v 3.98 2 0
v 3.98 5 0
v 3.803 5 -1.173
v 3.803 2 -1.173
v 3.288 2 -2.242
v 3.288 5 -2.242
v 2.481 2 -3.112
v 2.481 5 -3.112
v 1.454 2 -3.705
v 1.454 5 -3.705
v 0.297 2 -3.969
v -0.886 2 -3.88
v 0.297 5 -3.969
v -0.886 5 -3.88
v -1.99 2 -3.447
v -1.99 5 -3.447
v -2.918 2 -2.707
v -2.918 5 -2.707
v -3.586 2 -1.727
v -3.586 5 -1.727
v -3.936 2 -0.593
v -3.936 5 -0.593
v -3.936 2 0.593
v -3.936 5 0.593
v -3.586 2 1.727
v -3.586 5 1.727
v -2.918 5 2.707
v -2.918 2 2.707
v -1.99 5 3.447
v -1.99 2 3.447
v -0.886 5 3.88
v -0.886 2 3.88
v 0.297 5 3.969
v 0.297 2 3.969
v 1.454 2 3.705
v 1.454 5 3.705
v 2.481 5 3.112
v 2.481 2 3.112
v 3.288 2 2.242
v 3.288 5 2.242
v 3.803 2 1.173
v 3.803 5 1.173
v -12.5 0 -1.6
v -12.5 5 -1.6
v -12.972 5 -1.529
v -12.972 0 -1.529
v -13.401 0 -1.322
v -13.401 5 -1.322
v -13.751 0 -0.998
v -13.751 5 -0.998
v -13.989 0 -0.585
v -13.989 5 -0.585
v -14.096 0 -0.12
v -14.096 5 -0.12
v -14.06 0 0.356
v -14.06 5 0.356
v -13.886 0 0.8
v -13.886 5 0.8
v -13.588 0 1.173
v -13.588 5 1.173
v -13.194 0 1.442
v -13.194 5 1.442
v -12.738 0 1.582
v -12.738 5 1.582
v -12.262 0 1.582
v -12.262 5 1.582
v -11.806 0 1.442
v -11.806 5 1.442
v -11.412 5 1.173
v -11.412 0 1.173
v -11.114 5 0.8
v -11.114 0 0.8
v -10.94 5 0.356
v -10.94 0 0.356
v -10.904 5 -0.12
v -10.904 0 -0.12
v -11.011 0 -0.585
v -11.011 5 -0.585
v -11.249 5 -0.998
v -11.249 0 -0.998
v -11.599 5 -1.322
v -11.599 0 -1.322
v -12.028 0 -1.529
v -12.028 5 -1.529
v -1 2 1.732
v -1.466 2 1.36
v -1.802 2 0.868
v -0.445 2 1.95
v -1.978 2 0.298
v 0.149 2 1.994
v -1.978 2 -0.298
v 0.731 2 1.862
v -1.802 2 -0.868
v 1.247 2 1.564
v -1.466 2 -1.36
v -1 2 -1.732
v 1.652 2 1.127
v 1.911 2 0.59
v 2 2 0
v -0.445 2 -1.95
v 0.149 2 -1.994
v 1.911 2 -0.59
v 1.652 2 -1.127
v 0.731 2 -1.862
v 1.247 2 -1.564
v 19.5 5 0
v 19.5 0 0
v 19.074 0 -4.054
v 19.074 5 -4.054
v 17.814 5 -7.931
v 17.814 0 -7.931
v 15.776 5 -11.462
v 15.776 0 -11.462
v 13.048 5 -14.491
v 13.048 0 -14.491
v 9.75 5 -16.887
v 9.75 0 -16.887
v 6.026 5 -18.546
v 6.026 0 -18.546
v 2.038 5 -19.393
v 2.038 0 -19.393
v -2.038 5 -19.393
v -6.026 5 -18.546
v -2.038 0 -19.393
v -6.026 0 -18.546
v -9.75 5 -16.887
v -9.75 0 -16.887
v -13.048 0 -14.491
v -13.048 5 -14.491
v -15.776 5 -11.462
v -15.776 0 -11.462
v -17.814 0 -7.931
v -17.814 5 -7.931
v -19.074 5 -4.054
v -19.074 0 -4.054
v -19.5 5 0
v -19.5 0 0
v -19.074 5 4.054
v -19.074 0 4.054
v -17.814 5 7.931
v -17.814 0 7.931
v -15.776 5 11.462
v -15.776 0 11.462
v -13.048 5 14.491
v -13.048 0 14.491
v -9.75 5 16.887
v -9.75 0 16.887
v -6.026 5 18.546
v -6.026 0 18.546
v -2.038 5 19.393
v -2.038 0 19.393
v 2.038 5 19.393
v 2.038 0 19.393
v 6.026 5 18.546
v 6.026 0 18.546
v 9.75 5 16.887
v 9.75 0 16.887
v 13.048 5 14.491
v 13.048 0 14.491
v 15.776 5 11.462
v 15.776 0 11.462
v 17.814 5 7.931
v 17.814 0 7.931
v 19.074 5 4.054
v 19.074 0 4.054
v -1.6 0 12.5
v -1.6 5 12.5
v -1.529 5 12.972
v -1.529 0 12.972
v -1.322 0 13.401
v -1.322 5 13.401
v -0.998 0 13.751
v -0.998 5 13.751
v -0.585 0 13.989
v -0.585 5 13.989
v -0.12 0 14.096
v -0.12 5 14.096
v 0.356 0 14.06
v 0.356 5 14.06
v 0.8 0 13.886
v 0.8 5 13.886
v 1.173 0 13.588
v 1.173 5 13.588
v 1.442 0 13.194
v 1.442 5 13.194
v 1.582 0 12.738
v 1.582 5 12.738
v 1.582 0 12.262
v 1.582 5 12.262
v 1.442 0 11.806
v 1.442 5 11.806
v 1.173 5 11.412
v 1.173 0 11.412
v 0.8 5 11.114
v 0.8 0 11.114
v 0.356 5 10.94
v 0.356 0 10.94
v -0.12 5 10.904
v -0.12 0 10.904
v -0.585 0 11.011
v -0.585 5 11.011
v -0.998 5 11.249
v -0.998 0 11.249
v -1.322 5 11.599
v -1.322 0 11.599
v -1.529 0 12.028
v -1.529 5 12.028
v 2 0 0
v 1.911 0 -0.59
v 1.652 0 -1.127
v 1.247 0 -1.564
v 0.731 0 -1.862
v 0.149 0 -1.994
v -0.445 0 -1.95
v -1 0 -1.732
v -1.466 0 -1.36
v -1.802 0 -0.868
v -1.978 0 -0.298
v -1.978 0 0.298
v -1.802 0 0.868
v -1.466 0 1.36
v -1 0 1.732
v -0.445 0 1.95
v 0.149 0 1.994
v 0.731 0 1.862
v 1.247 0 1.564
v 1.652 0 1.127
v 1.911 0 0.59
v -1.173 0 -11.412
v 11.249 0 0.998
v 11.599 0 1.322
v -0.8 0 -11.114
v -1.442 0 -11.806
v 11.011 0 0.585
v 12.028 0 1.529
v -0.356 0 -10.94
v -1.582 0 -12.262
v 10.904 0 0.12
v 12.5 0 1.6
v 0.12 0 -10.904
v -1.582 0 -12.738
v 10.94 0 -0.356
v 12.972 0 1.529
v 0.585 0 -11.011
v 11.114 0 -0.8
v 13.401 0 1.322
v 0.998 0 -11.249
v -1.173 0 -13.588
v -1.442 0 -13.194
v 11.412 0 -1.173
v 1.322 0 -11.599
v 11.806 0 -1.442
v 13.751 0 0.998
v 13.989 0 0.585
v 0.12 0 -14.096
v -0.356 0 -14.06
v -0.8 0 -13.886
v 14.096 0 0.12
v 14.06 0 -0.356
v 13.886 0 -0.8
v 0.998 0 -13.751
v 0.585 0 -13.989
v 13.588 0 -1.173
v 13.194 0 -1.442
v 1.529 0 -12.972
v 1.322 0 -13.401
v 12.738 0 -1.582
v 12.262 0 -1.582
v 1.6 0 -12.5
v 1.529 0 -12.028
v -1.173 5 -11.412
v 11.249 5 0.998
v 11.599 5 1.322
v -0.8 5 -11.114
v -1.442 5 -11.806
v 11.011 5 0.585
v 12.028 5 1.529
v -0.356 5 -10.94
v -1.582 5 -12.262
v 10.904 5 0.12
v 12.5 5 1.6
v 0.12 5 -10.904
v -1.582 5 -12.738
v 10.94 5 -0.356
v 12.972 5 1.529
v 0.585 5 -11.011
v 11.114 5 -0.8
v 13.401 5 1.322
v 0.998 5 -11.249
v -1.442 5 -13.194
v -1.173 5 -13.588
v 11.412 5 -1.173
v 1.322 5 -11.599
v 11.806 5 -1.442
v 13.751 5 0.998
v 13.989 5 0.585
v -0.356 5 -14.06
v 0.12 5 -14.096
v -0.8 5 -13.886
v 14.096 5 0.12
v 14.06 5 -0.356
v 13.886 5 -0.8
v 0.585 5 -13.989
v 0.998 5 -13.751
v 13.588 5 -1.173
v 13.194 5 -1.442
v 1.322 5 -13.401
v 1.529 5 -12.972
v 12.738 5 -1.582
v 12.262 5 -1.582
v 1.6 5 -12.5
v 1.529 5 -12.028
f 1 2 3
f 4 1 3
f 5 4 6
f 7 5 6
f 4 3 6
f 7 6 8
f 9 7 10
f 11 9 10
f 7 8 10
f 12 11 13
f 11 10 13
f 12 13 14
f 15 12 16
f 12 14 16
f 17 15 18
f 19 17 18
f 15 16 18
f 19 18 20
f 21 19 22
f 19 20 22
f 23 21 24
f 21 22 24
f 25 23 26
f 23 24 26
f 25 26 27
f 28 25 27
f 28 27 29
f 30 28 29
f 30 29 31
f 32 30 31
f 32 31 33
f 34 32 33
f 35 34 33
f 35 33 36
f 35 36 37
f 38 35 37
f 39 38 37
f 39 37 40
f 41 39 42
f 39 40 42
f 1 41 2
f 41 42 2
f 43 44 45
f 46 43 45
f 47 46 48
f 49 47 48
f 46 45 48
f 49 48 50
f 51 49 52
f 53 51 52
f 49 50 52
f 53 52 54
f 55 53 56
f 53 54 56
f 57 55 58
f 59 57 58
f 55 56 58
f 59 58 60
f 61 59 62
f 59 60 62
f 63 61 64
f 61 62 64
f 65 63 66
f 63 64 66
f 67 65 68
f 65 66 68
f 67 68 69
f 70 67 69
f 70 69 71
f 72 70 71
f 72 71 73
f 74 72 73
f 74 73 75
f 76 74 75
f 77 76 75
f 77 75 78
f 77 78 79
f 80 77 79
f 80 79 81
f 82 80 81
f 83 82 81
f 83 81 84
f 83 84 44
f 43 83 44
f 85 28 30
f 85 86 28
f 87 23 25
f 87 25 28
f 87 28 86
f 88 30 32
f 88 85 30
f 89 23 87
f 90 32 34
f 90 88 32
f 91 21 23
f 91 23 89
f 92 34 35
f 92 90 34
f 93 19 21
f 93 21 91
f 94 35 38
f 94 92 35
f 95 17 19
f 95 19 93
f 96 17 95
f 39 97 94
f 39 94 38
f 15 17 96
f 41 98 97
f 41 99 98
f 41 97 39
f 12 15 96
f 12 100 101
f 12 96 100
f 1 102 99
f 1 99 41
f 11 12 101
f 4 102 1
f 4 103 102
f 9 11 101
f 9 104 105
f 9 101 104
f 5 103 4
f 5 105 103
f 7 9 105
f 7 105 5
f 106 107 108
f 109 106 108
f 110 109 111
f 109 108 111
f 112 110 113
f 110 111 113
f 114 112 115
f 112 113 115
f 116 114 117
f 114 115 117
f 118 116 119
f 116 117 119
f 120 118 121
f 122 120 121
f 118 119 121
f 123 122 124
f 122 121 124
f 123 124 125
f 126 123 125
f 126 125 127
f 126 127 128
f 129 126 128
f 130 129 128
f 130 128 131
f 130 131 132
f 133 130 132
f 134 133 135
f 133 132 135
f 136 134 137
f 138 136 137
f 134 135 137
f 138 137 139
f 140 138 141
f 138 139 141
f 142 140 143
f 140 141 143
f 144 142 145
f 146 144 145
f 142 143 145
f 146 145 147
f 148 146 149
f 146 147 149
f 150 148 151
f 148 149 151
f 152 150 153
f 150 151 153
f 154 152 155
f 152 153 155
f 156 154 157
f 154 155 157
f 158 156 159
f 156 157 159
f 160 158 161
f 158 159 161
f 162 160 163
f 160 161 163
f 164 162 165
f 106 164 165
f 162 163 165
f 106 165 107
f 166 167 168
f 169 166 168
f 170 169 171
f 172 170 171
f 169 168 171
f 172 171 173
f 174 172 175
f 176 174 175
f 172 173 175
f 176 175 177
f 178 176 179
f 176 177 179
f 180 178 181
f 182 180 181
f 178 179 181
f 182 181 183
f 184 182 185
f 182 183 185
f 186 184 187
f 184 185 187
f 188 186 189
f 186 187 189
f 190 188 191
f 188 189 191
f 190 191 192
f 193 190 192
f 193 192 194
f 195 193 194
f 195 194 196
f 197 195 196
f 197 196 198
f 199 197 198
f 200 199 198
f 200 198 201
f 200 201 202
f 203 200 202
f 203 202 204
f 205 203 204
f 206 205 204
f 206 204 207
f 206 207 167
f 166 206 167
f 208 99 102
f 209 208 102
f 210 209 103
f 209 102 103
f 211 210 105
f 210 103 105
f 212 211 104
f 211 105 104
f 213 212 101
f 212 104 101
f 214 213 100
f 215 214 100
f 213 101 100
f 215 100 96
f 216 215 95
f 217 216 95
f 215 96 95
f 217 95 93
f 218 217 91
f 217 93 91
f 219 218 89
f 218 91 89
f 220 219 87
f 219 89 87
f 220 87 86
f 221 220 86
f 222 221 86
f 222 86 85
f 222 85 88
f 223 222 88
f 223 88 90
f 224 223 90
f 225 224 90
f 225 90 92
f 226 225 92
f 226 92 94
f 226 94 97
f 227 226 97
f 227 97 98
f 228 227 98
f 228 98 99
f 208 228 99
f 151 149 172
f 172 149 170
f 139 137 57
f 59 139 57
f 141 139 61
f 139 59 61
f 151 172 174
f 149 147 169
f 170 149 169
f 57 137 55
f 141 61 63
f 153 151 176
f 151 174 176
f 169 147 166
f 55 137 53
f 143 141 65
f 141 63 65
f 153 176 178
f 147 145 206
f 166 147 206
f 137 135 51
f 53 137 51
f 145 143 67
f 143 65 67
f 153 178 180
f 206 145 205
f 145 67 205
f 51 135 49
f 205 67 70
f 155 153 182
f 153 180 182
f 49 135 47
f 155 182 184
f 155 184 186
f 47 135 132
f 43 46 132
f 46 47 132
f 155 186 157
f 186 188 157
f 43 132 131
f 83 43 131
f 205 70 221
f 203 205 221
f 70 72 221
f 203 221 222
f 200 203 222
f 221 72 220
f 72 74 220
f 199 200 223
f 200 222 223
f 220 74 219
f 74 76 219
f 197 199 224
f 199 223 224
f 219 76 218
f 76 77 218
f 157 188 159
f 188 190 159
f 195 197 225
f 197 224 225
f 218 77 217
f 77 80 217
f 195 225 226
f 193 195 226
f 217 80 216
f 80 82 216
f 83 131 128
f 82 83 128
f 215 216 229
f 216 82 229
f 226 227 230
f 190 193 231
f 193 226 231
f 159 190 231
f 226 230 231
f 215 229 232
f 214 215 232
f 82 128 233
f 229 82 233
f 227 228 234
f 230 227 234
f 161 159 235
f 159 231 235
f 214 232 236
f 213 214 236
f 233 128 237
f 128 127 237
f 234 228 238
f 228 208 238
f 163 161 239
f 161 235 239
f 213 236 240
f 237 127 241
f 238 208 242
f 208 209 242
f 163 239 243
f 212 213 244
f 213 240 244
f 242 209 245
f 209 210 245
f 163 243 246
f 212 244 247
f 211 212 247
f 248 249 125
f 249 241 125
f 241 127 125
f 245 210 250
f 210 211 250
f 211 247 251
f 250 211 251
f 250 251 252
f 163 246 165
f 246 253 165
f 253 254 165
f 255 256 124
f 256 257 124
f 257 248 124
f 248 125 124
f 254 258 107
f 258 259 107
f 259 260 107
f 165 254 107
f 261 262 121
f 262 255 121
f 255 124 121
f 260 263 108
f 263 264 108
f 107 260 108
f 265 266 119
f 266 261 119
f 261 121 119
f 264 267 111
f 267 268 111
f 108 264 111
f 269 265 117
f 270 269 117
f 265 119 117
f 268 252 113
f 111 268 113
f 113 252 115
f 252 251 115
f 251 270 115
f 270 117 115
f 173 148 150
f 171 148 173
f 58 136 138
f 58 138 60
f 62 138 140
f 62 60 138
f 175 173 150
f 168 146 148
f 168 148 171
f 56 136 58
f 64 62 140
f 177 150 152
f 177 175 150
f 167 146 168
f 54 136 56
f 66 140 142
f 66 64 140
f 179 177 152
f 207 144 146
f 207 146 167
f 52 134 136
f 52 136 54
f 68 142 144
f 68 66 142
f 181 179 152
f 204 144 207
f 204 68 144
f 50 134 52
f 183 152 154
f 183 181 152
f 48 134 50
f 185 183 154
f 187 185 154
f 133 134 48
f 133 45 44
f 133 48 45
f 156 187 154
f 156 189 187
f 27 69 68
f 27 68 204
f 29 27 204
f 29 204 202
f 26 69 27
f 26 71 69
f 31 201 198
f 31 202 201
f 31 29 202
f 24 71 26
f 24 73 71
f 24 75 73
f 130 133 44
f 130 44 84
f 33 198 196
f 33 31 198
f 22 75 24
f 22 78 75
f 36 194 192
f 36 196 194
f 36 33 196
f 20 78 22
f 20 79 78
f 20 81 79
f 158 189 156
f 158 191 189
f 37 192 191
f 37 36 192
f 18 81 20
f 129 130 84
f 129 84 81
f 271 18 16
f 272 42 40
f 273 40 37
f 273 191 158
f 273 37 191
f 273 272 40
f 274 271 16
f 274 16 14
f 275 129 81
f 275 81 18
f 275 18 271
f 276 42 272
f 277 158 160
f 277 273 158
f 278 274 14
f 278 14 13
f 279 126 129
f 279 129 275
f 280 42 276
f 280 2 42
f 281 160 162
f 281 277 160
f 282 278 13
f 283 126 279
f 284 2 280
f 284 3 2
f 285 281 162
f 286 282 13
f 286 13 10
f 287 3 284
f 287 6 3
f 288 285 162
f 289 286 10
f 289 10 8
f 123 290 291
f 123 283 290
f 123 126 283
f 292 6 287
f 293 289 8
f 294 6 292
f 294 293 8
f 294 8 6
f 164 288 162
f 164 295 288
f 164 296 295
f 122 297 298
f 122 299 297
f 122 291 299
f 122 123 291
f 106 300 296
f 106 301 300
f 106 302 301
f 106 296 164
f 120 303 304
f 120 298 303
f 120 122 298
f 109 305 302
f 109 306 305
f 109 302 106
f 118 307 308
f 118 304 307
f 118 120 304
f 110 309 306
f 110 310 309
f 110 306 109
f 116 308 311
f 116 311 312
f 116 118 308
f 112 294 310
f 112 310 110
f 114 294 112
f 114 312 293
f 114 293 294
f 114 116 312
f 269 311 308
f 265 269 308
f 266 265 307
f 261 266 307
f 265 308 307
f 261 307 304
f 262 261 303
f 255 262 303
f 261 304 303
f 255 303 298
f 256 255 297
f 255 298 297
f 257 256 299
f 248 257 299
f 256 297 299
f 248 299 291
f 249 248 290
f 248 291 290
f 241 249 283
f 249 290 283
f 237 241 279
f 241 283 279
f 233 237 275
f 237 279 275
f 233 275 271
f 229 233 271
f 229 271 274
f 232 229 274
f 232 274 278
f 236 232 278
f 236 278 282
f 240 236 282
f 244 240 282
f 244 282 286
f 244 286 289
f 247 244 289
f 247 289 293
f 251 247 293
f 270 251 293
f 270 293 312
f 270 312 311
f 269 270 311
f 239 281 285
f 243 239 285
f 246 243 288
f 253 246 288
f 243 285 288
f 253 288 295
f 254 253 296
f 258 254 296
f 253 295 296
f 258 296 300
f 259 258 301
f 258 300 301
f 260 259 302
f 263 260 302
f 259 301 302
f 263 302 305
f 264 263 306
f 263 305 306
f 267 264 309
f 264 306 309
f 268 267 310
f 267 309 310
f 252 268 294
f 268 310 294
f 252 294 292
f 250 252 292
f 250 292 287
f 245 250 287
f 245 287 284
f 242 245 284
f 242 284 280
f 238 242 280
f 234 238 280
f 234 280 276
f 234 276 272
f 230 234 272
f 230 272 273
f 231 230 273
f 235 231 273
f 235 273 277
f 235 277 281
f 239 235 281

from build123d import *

# Parameters (mm, degrees)
SKETCH1_R           = 19.5
BOSS_EXTRUDE1_DEPTH = 5
SKETCH2_R           = 3.98
CUT_EXTRUDE1_DEPTH  = 3
SKETCH3_R           = 2
CUT_EXTRUDE2_DEPTH  = 3
SKETCH4_R           = 1.6
CUT_EXTRUDE3_DEPTH  = 6
CIRPATTERN1_COUNT   = 4


with BuildPart() as part:
    # Sketch1 → Boss-Extrude1 (new body)
    with BuildSketch(Plane(origin=(0, 0, 0), x_dir=(1, 0, 0), z_dir=(0, 1, 0))):
        Circle(SKETCH1_R)
    extrude(amount=BOSS_EXTRUDE1_DEPTH)

    # Sketch2 → Cut-Extrude1 (cut)
    with BuildSketch(Plane(origin=(0, 5, 0), x_dir=(1, 0, 0), z_dir=(0, 1, 0))):
        Circle(SKETCH2_R)
    extrude(amount=-CUT_EXTRUDE1_DEPTH, mode=Mode.SUBTRACT)

    # Sketch3 → Cut-Extrude2 (cut)
    with BuildSketch(Plane(origin=(0, 2, 0), x_dir=(1, 0, 0), z_dir=(0, 1, 0))):
        Circle(SKETCH3_R)
    extrude(amount=-CUT_EXTRUDE2_DEPTH, mode=Mode.SUBTRACT)

    # Sketch4 → Cut-Extrude3 (cut, through all)
    with BuildSketch(Plane(origin=(0, 5, 0), x_dir=(1, 0, 0), z_dir=(0, 1, 0))):
        with Locations((0, 12.5)):
            Circle(SKETCH4_R)
    cut_extrude3 = extrude(amount=-CUT_EXTRUDE3_DEPTH, mode=Mode.SUBTRACT)

    # CirPattern1: Cut-Extrude3 ×4 about axis
    cirpattern1_axis = Axis((0, 0, 0), (0, 1, 0))
    for i in range(1, CIRPATTERN1_COUNT):
        add(cut_extrude3.rotate(cirpattern1_axis, i * 360 / CIRPATTERN1_COUNT), mode=Mode.SUBTRACT)


solid = part.part
